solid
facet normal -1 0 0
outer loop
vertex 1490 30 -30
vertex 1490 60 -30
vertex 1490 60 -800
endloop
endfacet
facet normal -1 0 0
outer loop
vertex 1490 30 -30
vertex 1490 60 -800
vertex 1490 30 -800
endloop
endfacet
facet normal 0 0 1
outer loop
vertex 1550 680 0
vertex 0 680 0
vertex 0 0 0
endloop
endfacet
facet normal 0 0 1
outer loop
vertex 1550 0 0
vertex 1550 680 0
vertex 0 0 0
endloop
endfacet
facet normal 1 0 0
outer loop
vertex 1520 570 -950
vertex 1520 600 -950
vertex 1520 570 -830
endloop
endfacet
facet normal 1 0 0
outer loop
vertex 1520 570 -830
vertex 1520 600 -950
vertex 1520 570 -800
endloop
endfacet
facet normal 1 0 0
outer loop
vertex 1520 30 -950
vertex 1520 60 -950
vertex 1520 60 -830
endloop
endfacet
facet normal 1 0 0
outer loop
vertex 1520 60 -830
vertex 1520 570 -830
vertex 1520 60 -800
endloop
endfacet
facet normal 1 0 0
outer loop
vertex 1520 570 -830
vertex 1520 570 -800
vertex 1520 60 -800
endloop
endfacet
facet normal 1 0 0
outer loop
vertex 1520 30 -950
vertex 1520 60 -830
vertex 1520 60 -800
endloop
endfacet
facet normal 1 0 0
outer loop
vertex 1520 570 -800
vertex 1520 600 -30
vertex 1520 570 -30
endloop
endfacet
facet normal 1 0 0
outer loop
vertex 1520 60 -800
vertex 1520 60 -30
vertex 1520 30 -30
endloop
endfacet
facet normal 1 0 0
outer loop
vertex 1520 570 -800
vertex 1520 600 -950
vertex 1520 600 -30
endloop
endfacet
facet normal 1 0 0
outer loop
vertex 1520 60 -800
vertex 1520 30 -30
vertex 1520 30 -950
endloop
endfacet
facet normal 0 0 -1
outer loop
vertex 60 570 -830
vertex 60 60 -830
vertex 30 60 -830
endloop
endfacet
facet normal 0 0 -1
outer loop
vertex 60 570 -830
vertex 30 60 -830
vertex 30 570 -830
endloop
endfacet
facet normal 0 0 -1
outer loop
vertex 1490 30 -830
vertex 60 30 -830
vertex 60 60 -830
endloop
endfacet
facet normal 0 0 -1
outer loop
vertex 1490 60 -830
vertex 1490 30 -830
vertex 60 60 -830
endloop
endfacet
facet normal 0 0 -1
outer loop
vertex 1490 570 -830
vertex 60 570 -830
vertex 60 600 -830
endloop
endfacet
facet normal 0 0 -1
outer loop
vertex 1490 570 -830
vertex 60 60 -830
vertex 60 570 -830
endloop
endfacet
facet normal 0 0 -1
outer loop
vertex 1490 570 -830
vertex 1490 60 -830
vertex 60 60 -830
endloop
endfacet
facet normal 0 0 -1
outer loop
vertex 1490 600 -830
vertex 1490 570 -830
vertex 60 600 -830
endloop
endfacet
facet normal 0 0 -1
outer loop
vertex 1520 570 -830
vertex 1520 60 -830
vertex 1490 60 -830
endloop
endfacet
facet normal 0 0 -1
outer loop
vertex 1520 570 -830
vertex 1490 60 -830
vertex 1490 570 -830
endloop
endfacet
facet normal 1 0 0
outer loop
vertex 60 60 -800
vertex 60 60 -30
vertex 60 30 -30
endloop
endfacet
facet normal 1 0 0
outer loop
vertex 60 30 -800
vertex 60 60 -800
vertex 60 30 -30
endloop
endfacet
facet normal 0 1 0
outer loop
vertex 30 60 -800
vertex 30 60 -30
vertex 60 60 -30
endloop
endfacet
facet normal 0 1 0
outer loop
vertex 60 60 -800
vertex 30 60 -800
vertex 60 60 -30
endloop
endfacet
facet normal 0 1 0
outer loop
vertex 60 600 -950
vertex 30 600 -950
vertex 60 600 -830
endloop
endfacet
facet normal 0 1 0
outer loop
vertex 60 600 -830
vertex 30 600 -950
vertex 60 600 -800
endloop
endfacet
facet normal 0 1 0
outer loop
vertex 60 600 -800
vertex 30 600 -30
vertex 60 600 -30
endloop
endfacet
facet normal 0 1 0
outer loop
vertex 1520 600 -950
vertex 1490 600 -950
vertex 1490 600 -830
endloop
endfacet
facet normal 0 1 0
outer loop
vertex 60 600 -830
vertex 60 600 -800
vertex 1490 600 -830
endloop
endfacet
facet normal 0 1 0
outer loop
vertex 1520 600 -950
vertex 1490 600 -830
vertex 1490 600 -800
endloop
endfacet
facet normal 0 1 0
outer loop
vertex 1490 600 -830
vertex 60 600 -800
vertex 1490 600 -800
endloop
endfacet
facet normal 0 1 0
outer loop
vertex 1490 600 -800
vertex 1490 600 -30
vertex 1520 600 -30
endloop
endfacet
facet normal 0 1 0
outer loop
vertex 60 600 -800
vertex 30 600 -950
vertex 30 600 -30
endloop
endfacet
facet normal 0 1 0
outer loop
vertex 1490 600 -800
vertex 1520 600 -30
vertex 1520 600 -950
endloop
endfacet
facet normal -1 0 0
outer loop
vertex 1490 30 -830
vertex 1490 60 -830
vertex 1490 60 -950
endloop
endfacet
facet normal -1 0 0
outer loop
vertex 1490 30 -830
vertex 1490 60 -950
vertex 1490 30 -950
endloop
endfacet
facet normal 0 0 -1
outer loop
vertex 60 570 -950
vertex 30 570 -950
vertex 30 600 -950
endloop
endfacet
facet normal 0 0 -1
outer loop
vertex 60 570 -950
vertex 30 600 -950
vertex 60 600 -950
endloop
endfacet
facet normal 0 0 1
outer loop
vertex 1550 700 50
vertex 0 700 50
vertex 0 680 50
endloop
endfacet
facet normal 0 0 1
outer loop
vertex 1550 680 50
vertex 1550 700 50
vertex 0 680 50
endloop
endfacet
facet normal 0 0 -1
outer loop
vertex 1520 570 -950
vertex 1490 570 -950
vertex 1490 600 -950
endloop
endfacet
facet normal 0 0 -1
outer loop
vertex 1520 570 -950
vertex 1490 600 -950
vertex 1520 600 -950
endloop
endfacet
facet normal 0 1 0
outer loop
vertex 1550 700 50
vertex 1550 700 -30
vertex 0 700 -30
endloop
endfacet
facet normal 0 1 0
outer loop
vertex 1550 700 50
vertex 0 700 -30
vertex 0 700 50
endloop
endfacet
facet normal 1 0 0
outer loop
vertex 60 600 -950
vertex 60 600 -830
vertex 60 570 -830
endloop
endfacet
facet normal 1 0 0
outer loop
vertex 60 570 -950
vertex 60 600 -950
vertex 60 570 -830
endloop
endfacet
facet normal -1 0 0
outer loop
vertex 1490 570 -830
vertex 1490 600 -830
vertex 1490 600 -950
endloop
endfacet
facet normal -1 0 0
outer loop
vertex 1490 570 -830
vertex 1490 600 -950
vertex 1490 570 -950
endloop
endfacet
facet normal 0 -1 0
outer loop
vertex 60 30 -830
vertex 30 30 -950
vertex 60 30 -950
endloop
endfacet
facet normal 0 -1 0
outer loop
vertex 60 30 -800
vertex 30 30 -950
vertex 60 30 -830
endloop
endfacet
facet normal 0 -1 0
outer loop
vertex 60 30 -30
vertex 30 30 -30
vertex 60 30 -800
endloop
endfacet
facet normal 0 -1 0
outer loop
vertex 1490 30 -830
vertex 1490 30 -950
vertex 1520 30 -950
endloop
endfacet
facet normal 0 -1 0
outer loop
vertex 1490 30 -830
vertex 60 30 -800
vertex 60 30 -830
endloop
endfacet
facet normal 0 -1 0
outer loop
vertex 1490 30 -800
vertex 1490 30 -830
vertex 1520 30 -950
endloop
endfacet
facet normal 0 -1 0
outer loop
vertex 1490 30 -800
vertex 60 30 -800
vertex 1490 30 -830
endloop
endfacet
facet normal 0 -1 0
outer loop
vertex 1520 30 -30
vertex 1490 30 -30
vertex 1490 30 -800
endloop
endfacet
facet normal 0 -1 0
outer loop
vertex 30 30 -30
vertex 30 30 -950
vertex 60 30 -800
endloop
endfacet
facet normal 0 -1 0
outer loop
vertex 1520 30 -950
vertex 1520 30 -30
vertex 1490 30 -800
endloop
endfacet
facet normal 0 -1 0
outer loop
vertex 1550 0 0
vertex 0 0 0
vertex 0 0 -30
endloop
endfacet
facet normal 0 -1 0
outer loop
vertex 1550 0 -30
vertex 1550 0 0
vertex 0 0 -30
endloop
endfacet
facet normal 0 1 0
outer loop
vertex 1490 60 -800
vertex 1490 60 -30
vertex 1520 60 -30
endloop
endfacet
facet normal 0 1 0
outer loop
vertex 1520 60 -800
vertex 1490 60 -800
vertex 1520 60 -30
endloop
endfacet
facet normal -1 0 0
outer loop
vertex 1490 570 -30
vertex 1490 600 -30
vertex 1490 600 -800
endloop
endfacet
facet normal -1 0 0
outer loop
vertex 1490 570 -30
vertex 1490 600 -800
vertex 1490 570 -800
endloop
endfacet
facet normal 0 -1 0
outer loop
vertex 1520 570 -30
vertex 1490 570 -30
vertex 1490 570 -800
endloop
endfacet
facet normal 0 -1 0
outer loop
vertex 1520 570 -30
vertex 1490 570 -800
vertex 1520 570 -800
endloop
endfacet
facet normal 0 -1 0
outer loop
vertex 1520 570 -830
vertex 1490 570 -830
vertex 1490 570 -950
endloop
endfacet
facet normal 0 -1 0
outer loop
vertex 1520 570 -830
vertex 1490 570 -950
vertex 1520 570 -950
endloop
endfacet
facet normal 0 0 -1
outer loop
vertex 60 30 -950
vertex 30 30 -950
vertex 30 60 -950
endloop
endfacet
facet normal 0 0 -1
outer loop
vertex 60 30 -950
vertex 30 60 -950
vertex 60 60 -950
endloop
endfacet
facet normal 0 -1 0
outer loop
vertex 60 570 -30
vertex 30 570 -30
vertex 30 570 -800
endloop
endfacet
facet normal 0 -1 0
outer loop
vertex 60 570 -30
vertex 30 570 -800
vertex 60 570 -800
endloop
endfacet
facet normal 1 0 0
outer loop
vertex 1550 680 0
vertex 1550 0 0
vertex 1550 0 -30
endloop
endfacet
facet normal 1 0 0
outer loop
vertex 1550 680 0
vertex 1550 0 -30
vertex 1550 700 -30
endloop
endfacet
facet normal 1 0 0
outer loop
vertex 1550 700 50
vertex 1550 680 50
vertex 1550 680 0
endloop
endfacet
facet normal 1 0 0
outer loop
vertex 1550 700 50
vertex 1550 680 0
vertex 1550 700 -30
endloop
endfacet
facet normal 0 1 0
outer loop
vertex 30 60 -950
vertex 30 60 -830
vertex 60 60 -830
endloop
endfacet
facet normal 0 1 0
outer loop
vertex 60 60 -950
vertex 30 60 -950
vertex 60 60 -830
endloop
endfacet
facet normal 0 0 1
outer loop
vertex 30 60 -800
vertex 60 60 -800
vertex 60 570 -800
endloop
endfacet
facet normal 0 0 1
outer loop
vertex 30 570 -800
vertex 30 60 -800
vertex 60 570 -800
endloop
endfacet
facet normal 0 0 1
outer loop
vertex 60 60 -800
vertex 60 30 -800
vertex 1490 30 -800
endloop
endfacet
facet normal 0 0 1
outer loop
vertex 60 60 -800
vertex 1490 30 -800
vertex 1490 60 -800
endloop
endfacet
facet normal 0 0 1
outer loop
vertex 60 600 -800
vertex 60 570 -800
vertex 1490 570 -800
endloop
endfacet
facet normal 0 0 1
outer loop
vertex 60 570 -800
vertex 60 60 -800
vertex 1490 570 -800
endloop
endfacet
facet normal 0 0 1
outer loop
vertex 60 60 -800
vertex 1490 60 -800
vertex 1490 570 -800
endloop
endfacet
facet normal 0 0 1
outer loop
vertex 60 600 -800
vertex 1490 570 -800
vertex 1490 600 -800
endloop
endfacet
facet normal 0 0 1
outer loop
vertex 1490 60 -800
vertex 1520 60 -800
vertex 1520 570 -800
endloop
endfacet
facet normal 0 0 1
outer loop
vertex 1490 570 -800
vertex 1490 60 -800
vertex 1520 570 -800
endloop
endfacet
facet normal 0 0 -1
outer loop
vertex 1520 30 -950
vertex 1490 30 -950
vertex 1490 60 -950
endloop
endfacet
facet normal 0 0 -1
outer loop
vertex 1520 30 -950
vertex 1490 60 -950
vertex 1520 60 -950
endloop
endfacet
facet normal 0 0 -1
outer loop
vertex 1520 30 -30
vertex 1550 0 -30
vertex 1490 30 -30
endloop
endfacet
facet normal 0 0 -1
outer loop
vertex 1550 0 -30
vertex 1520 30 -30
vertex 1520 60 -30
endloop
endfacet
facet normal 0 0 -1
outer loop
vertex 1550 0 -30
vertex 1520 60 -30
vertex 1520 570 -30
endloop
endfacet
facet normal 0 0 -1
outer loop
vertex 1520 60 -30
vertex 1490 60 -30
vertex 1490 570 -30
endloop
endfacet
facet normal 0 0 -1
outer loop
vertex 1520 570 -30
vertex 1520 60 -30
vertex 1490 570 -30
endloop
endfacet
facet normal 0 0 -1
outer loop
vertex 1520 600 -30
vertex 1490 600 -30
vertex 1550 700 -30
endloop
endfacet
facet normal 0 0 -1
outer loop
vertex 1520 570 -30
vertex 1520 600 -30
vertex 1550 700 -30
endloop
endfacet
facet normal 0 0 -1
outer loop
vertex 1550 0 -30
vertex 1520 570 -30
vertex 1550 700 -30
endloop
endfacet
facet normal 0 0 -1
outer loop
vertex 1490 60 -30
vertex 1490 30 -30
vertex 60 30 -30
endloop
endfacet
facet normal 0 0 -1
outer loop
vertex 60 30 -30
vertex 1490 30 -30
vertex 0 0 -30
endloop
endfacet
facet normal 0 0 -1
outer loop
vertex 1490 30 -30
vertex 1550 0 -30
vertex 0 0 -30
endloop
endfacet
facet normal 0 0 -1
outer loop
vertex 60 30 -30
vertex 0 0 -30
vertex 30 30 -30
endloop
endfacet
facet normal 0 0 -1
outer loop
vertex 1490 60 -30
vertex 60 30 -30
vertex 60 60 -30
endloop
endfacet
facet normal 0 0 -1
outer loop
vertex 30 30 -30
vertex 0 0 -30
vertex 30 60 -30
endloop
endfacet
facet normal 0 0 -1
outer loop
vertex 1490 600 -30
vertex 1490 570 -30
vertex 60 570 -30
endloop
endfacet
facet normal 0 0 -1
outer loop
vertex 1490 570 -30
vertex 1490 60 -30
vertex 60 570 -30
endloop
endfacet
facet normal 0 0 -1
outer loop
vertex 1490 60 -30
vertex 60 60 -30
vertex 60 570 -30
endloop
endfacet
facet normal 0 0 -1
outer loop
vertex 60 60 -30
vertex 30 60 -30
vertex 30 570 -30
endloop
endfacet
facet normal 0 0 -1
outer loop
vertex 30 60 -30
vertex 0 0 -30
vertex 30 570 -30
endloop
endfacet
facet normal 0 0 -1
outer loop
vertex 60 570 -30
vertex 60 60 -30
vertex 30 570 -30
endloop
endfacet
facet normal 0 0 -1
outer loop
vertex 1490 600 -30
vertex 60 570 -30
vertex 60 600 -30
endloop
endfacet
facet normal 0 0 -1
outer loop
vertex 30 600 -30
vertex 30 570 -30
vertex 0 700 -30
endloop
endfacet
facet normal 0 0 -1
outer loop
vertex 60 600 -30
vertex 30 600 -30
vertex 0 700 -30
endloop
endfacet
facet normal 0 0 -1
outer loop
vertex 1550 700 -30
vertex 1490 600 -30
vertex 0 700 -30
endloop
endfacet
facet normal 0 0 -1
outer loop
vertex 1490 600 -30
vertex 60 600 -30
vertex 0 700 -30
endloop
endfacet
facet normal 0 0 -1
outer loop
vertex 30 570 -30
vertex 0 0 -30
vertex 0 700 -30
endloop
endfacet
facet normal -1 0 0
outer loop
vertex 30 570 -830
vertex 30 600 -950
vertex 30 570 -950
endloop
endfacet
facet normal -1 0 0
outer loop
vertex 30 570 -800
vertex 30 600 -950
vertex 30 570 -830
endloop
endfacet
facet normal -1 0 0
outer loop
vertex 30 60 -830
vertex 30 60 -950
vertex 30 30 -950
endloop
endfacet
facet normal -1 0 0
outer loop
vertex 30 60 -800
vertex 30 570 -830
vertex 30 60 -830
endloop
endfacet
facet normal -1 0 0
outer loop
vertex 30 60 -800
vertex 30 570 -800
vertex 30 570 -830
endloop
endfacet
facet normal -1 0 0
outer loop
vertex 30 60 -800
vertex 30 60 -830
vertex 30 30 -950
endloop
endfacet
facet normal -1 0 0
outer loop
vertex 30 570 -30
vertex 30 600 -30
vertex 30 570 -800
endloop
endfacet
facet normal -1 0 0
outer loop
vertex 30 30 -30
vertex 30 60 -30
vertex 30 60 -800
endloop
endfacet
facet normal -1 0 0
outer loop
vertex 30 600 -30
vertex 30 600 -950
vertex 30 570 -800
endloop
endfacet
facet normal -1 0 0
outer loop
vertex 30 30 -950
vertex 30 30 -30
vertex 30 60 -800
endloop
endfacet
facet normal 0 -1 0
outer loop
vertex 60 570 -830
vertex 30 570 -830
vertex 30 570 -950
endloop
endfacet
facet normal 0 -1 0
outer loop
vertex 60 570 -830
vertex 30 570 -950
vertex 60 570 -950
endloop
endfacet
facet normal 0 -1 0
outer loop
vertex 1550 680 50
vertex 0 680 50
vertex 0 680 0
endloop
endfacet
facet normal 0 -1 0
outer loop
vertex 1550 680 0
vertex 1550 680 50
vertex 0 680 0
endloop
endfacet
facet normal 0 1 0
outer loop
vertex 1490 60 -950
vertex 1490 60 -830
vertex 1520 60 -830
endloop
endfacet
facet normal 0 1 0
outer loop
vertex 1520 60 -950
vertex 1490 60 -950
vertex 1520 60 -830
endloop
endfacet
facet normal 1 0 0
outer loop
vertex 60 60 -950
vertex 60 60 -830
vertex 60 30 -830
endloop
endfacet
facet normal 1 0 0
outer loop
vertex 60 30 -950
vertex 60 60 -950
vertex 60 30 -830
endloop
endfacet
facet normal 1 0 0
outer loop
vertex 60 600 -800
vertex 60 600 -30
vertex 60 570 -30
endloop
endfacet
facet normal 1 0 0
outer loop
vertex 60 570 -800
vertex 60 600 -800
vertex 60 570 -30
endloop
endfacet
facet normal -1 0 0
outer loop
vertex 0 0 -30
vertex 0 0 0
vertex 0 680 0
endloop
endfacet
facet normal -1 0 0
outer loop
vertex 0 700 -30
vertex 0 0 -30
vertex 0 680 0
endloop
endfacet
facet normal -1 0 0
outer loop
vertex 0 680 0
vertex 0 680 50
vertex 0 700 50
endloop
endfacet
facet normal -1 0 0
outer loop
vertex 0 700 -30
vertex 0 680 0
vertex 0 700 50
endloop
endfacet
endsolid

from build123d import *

# Parameters (mm, degrees)
F1_DEPTH = 1550
F2_W     = 30
F2_H     = 30
F3_DEPTH = 920
F4_W     = 570
F4_H     = 30
F5_DEPTH = 1490


with BuildPart() as f1:
    # F0 (on Right) → F1 (new body)
    with BuildSketch(Plane.YZ):
        Polygon((680, 0), (0, 0), (0, -30), (700, -30), (700, 50), (680, 50), align=None)
    extrude(amount=F1_DEPTH)

    # F2 (on face) → F3 (join)
    with BuildSketch(Plane(origin=(0, 0, -30), x_dir=(1, 0, 0), z_dir=(0, 0, -1))):
        with Locations((1505, -45)):
            Rectangle(F2_W, F2_H)
        with Locations((1505, -585)):
            Rectangle(F2_W, F2_H)
        with Locations((45, -585)):
            Rectangle(F2_W, F2_H)
        with Locations((45, -45)):
            Rectangle(F2_W, F2_H)
    extrude(amount=F3_DEPTH)

    # F4 (on face) → F5 (join, through all)
    with BuildSketch(Plane.YZ.offset(1520)):
        with Locations((315, -815)):
            Rectangle(F4_W, F4_H)
    extrude(amount=-F5_DEPTH)


solid = f1.part
